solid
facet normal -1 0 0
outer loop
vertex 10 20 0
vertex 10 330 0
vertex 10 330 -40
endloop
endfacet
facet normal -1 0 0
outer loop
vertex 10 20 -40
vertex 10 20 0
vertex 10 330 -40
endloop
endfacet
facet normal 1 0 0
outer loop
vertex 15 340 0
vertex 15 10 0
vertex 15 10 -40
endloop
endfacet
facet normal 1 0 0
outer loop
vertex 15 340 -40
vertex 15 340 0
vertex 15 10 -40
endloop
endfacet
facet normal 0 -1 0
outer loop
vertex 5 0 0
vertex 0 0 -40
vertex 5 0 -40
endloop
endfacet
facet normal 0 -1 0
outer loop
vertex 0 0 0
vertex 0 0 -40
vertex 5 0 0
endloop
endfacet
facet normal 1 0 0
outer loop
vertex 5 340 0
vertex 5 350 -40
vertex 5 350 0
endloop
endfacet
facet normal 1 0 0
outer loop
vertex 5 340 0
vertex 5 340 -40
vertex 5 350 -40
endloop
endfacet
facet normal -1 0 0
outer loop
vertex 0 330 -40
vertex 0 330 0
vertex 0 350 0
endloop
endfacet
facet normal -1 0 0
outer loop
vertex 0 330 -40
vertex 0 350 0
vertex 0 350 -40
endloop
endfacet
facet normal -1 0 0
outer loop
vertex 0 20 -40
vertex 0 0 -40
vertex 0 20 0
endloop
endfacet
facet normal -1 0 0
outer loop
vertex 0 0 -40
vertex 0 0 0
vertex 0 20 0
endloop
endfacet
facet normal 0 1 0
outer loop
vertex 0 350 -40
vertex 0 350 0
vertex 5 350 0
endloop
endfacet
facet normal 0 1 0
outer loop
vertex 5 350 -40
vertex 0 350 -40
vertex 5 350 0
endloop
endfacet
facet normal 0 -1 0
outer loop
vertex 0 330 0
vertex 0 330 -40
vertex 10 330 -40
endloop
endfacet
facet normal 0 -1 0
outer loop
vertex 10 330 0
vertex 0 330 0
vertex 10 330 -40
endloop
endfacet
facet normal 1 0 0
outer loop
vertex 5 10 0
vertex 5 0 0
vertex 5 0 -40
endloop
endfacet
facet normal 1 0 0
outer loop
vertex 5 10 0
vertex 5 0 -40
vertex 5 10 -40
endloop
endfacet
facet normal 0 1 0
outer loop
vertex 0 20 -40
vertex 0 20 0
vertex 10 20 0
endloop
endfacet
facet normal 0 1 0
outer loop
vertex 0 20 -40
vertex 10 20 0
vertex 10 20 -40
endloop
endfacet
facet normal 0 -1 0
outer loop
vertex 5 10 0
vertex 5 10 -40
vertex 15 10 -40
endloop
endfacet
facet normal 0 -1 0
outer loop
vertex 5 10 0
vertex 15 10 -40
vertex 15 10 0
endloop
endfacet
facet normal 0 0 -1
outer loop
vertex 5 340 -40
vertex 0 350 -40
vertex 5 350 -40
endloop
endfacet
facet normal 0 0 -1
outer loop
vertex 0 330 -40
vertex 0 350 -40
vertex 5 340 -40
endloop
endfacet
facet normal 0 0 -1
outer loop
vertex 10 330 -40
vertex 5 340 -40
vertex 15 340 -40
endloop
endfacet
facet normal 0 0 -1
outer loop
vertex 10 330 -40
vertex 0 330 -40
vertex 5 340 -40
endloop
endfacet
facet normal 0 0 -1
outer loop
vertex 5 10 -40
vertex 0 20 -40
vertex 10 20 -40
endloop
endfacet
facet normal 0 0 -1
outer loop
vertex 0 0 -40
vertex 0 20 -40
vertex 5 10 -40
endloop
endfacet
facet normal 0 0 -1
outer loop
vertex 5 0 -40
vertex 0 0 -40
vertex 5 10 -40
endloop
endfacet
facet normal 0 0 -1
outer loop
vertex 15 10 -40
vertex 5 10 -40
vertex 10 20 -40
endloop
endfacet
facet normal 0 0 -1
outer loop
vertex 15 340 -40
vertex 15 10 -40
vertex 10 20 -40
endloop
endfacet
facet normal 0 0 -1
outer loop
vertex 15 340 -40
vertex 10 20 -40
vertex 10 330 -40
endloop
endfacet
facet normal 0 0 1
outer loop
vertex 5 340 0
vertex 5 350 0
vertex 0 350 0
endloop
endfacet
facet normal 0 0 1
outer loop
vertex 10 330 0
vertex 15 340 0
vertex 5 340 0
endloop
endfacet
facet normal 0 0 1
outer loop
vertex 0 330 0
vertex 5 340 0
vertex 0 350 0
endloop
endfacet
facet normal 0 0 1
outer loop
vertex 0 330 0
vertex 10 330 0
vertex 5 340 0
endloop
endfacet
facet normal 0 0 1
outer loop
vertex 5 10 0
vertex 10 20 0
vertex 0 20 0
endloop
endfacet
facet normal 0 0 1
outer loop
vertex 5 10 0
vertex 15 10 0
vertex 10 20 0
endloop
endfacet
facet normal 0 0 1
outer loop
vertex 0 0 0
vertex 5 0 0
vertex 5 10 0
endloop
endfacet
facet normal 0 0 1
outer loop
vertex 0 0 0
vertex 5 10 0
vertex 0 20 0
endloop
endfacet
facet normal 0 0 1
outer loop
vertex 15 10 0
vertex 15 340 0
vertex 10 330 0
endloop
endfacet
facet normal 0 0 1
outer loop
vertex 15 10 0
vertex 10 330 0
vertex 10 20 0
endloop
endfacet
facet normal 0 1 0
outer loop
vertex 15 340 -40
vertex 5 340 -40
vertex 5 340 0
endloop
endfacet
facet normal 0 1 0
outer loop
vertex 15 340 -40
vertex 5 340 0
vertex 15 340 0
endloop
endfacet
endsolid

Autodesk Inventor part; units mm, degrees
ref_plane "YZ Plane" through (0, 0, 0) normal (1, 0, 0) x (0, 1, 0)
ref_plane "XZ Plane" through (0, 0, 0) normal (0, 1, 0) x (-1, 0, 0)
ref_plane "XY Plane" through (0, 0, 0) normal (0, 0, 1) x (1, 0, 0)
sketch "스케치1" plane through (0, 0, 0) normal (1, 0, 0) x (0, 1, 0)
  line L0 (0, 0) -> (20, 0)
  line L1 (20, 0) -> (20, -40)
  line L2 (20, -40) -> (0, -40)
  line L3 (0, -40) -> (0, 0)
  dimension "d0" = 20
  dimension "d1" = 40
extrude "돌출1" add sketch "스케치1" along normal blind 5
sketch "스케치2" plane through (5, 0, 0) normal (1, 0, 0) x (0, 0, -1)
  line L0 (40, 20) -> (0, 20) projected
  line L1 (0, 20) -> (40, 20)
  line L2 (40, 20) -> (40, 10)
  line L3 (40, 10) -> (0, 10)
  line L4 (0, 10) -> (0, 20)
  point P0 (0, 0)
  dimension "d4" = 40
  dimension "d5" = 10
extrude "돌출2" add sketch "스케치2" along normal blind 10
sketch "스케치3" plane through (15, 0, 0) normal (1, 0, 0) x (0, 0, -1)
  line L0 (0, 20) -> (40, 20)
  line L1 (40, 20) -> (40, 330)
  line L2 (40, 330) -> (0, 330)
  line L3 (0, 330) -> (0, 20)
  line L4 (40, 20) -> (0, 20) projected
  point P0 (0, 0)
  dimension "d8" = 40
  dimension "d9" = 310
extrude "돌출3" add sketch "스케치3" against normal blind 5
sketch "스케치4" plane through (15, 330, 0) normal (0, 1, 0) x (1, 0, 0)
  line L0 (0, 0) -> (0, 40) projected
  line L1 (-15, 40) -> (-15, 0) projected
  line L2 (0, 0) -> (-15, 0)
  line L3 (-15, 0) -> (-15, 40)
  line L4 (-15, 40) -> (0, 40)
  line L5 (0, 40) -> (0, 0)
  dimension "d15" = 15
  dimension "d16" = 40
extrude "돌출4" add sketch "스케치4" along normal blind 10
sketch "스케치5" plane through (15, 340, 0) normal (0, 1, 0) x (1, 0, 0)
  line L0 (-15, 40) -> (-10, 40) projected
  line L1 (-15, 40) -> (-10, 40)
  line L2 (-10, 40) -> (-10, 0)
  line L3 (-10, 0) -> (-15, 0)
  line L4 (-15, 0) -> (-15, 40)
  dimension "d19" = 5
  dimension "d20" = 40
extrude "돌출5" add sketch "스케치5" along normal blind 10
properties part number "link"
